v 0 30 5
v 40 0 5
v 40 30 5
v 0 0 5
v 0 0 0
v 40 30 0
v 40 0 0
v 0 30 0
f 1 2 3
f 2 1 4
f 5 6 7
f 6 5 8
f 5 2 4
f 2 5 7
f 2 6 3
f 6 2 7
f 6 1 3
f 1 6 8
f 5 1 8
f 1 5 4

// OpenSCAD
// units=mm — generated by scad_emitter.py
// part=plain_plate
$fn = 48;

cube([40, 30, 5]);
